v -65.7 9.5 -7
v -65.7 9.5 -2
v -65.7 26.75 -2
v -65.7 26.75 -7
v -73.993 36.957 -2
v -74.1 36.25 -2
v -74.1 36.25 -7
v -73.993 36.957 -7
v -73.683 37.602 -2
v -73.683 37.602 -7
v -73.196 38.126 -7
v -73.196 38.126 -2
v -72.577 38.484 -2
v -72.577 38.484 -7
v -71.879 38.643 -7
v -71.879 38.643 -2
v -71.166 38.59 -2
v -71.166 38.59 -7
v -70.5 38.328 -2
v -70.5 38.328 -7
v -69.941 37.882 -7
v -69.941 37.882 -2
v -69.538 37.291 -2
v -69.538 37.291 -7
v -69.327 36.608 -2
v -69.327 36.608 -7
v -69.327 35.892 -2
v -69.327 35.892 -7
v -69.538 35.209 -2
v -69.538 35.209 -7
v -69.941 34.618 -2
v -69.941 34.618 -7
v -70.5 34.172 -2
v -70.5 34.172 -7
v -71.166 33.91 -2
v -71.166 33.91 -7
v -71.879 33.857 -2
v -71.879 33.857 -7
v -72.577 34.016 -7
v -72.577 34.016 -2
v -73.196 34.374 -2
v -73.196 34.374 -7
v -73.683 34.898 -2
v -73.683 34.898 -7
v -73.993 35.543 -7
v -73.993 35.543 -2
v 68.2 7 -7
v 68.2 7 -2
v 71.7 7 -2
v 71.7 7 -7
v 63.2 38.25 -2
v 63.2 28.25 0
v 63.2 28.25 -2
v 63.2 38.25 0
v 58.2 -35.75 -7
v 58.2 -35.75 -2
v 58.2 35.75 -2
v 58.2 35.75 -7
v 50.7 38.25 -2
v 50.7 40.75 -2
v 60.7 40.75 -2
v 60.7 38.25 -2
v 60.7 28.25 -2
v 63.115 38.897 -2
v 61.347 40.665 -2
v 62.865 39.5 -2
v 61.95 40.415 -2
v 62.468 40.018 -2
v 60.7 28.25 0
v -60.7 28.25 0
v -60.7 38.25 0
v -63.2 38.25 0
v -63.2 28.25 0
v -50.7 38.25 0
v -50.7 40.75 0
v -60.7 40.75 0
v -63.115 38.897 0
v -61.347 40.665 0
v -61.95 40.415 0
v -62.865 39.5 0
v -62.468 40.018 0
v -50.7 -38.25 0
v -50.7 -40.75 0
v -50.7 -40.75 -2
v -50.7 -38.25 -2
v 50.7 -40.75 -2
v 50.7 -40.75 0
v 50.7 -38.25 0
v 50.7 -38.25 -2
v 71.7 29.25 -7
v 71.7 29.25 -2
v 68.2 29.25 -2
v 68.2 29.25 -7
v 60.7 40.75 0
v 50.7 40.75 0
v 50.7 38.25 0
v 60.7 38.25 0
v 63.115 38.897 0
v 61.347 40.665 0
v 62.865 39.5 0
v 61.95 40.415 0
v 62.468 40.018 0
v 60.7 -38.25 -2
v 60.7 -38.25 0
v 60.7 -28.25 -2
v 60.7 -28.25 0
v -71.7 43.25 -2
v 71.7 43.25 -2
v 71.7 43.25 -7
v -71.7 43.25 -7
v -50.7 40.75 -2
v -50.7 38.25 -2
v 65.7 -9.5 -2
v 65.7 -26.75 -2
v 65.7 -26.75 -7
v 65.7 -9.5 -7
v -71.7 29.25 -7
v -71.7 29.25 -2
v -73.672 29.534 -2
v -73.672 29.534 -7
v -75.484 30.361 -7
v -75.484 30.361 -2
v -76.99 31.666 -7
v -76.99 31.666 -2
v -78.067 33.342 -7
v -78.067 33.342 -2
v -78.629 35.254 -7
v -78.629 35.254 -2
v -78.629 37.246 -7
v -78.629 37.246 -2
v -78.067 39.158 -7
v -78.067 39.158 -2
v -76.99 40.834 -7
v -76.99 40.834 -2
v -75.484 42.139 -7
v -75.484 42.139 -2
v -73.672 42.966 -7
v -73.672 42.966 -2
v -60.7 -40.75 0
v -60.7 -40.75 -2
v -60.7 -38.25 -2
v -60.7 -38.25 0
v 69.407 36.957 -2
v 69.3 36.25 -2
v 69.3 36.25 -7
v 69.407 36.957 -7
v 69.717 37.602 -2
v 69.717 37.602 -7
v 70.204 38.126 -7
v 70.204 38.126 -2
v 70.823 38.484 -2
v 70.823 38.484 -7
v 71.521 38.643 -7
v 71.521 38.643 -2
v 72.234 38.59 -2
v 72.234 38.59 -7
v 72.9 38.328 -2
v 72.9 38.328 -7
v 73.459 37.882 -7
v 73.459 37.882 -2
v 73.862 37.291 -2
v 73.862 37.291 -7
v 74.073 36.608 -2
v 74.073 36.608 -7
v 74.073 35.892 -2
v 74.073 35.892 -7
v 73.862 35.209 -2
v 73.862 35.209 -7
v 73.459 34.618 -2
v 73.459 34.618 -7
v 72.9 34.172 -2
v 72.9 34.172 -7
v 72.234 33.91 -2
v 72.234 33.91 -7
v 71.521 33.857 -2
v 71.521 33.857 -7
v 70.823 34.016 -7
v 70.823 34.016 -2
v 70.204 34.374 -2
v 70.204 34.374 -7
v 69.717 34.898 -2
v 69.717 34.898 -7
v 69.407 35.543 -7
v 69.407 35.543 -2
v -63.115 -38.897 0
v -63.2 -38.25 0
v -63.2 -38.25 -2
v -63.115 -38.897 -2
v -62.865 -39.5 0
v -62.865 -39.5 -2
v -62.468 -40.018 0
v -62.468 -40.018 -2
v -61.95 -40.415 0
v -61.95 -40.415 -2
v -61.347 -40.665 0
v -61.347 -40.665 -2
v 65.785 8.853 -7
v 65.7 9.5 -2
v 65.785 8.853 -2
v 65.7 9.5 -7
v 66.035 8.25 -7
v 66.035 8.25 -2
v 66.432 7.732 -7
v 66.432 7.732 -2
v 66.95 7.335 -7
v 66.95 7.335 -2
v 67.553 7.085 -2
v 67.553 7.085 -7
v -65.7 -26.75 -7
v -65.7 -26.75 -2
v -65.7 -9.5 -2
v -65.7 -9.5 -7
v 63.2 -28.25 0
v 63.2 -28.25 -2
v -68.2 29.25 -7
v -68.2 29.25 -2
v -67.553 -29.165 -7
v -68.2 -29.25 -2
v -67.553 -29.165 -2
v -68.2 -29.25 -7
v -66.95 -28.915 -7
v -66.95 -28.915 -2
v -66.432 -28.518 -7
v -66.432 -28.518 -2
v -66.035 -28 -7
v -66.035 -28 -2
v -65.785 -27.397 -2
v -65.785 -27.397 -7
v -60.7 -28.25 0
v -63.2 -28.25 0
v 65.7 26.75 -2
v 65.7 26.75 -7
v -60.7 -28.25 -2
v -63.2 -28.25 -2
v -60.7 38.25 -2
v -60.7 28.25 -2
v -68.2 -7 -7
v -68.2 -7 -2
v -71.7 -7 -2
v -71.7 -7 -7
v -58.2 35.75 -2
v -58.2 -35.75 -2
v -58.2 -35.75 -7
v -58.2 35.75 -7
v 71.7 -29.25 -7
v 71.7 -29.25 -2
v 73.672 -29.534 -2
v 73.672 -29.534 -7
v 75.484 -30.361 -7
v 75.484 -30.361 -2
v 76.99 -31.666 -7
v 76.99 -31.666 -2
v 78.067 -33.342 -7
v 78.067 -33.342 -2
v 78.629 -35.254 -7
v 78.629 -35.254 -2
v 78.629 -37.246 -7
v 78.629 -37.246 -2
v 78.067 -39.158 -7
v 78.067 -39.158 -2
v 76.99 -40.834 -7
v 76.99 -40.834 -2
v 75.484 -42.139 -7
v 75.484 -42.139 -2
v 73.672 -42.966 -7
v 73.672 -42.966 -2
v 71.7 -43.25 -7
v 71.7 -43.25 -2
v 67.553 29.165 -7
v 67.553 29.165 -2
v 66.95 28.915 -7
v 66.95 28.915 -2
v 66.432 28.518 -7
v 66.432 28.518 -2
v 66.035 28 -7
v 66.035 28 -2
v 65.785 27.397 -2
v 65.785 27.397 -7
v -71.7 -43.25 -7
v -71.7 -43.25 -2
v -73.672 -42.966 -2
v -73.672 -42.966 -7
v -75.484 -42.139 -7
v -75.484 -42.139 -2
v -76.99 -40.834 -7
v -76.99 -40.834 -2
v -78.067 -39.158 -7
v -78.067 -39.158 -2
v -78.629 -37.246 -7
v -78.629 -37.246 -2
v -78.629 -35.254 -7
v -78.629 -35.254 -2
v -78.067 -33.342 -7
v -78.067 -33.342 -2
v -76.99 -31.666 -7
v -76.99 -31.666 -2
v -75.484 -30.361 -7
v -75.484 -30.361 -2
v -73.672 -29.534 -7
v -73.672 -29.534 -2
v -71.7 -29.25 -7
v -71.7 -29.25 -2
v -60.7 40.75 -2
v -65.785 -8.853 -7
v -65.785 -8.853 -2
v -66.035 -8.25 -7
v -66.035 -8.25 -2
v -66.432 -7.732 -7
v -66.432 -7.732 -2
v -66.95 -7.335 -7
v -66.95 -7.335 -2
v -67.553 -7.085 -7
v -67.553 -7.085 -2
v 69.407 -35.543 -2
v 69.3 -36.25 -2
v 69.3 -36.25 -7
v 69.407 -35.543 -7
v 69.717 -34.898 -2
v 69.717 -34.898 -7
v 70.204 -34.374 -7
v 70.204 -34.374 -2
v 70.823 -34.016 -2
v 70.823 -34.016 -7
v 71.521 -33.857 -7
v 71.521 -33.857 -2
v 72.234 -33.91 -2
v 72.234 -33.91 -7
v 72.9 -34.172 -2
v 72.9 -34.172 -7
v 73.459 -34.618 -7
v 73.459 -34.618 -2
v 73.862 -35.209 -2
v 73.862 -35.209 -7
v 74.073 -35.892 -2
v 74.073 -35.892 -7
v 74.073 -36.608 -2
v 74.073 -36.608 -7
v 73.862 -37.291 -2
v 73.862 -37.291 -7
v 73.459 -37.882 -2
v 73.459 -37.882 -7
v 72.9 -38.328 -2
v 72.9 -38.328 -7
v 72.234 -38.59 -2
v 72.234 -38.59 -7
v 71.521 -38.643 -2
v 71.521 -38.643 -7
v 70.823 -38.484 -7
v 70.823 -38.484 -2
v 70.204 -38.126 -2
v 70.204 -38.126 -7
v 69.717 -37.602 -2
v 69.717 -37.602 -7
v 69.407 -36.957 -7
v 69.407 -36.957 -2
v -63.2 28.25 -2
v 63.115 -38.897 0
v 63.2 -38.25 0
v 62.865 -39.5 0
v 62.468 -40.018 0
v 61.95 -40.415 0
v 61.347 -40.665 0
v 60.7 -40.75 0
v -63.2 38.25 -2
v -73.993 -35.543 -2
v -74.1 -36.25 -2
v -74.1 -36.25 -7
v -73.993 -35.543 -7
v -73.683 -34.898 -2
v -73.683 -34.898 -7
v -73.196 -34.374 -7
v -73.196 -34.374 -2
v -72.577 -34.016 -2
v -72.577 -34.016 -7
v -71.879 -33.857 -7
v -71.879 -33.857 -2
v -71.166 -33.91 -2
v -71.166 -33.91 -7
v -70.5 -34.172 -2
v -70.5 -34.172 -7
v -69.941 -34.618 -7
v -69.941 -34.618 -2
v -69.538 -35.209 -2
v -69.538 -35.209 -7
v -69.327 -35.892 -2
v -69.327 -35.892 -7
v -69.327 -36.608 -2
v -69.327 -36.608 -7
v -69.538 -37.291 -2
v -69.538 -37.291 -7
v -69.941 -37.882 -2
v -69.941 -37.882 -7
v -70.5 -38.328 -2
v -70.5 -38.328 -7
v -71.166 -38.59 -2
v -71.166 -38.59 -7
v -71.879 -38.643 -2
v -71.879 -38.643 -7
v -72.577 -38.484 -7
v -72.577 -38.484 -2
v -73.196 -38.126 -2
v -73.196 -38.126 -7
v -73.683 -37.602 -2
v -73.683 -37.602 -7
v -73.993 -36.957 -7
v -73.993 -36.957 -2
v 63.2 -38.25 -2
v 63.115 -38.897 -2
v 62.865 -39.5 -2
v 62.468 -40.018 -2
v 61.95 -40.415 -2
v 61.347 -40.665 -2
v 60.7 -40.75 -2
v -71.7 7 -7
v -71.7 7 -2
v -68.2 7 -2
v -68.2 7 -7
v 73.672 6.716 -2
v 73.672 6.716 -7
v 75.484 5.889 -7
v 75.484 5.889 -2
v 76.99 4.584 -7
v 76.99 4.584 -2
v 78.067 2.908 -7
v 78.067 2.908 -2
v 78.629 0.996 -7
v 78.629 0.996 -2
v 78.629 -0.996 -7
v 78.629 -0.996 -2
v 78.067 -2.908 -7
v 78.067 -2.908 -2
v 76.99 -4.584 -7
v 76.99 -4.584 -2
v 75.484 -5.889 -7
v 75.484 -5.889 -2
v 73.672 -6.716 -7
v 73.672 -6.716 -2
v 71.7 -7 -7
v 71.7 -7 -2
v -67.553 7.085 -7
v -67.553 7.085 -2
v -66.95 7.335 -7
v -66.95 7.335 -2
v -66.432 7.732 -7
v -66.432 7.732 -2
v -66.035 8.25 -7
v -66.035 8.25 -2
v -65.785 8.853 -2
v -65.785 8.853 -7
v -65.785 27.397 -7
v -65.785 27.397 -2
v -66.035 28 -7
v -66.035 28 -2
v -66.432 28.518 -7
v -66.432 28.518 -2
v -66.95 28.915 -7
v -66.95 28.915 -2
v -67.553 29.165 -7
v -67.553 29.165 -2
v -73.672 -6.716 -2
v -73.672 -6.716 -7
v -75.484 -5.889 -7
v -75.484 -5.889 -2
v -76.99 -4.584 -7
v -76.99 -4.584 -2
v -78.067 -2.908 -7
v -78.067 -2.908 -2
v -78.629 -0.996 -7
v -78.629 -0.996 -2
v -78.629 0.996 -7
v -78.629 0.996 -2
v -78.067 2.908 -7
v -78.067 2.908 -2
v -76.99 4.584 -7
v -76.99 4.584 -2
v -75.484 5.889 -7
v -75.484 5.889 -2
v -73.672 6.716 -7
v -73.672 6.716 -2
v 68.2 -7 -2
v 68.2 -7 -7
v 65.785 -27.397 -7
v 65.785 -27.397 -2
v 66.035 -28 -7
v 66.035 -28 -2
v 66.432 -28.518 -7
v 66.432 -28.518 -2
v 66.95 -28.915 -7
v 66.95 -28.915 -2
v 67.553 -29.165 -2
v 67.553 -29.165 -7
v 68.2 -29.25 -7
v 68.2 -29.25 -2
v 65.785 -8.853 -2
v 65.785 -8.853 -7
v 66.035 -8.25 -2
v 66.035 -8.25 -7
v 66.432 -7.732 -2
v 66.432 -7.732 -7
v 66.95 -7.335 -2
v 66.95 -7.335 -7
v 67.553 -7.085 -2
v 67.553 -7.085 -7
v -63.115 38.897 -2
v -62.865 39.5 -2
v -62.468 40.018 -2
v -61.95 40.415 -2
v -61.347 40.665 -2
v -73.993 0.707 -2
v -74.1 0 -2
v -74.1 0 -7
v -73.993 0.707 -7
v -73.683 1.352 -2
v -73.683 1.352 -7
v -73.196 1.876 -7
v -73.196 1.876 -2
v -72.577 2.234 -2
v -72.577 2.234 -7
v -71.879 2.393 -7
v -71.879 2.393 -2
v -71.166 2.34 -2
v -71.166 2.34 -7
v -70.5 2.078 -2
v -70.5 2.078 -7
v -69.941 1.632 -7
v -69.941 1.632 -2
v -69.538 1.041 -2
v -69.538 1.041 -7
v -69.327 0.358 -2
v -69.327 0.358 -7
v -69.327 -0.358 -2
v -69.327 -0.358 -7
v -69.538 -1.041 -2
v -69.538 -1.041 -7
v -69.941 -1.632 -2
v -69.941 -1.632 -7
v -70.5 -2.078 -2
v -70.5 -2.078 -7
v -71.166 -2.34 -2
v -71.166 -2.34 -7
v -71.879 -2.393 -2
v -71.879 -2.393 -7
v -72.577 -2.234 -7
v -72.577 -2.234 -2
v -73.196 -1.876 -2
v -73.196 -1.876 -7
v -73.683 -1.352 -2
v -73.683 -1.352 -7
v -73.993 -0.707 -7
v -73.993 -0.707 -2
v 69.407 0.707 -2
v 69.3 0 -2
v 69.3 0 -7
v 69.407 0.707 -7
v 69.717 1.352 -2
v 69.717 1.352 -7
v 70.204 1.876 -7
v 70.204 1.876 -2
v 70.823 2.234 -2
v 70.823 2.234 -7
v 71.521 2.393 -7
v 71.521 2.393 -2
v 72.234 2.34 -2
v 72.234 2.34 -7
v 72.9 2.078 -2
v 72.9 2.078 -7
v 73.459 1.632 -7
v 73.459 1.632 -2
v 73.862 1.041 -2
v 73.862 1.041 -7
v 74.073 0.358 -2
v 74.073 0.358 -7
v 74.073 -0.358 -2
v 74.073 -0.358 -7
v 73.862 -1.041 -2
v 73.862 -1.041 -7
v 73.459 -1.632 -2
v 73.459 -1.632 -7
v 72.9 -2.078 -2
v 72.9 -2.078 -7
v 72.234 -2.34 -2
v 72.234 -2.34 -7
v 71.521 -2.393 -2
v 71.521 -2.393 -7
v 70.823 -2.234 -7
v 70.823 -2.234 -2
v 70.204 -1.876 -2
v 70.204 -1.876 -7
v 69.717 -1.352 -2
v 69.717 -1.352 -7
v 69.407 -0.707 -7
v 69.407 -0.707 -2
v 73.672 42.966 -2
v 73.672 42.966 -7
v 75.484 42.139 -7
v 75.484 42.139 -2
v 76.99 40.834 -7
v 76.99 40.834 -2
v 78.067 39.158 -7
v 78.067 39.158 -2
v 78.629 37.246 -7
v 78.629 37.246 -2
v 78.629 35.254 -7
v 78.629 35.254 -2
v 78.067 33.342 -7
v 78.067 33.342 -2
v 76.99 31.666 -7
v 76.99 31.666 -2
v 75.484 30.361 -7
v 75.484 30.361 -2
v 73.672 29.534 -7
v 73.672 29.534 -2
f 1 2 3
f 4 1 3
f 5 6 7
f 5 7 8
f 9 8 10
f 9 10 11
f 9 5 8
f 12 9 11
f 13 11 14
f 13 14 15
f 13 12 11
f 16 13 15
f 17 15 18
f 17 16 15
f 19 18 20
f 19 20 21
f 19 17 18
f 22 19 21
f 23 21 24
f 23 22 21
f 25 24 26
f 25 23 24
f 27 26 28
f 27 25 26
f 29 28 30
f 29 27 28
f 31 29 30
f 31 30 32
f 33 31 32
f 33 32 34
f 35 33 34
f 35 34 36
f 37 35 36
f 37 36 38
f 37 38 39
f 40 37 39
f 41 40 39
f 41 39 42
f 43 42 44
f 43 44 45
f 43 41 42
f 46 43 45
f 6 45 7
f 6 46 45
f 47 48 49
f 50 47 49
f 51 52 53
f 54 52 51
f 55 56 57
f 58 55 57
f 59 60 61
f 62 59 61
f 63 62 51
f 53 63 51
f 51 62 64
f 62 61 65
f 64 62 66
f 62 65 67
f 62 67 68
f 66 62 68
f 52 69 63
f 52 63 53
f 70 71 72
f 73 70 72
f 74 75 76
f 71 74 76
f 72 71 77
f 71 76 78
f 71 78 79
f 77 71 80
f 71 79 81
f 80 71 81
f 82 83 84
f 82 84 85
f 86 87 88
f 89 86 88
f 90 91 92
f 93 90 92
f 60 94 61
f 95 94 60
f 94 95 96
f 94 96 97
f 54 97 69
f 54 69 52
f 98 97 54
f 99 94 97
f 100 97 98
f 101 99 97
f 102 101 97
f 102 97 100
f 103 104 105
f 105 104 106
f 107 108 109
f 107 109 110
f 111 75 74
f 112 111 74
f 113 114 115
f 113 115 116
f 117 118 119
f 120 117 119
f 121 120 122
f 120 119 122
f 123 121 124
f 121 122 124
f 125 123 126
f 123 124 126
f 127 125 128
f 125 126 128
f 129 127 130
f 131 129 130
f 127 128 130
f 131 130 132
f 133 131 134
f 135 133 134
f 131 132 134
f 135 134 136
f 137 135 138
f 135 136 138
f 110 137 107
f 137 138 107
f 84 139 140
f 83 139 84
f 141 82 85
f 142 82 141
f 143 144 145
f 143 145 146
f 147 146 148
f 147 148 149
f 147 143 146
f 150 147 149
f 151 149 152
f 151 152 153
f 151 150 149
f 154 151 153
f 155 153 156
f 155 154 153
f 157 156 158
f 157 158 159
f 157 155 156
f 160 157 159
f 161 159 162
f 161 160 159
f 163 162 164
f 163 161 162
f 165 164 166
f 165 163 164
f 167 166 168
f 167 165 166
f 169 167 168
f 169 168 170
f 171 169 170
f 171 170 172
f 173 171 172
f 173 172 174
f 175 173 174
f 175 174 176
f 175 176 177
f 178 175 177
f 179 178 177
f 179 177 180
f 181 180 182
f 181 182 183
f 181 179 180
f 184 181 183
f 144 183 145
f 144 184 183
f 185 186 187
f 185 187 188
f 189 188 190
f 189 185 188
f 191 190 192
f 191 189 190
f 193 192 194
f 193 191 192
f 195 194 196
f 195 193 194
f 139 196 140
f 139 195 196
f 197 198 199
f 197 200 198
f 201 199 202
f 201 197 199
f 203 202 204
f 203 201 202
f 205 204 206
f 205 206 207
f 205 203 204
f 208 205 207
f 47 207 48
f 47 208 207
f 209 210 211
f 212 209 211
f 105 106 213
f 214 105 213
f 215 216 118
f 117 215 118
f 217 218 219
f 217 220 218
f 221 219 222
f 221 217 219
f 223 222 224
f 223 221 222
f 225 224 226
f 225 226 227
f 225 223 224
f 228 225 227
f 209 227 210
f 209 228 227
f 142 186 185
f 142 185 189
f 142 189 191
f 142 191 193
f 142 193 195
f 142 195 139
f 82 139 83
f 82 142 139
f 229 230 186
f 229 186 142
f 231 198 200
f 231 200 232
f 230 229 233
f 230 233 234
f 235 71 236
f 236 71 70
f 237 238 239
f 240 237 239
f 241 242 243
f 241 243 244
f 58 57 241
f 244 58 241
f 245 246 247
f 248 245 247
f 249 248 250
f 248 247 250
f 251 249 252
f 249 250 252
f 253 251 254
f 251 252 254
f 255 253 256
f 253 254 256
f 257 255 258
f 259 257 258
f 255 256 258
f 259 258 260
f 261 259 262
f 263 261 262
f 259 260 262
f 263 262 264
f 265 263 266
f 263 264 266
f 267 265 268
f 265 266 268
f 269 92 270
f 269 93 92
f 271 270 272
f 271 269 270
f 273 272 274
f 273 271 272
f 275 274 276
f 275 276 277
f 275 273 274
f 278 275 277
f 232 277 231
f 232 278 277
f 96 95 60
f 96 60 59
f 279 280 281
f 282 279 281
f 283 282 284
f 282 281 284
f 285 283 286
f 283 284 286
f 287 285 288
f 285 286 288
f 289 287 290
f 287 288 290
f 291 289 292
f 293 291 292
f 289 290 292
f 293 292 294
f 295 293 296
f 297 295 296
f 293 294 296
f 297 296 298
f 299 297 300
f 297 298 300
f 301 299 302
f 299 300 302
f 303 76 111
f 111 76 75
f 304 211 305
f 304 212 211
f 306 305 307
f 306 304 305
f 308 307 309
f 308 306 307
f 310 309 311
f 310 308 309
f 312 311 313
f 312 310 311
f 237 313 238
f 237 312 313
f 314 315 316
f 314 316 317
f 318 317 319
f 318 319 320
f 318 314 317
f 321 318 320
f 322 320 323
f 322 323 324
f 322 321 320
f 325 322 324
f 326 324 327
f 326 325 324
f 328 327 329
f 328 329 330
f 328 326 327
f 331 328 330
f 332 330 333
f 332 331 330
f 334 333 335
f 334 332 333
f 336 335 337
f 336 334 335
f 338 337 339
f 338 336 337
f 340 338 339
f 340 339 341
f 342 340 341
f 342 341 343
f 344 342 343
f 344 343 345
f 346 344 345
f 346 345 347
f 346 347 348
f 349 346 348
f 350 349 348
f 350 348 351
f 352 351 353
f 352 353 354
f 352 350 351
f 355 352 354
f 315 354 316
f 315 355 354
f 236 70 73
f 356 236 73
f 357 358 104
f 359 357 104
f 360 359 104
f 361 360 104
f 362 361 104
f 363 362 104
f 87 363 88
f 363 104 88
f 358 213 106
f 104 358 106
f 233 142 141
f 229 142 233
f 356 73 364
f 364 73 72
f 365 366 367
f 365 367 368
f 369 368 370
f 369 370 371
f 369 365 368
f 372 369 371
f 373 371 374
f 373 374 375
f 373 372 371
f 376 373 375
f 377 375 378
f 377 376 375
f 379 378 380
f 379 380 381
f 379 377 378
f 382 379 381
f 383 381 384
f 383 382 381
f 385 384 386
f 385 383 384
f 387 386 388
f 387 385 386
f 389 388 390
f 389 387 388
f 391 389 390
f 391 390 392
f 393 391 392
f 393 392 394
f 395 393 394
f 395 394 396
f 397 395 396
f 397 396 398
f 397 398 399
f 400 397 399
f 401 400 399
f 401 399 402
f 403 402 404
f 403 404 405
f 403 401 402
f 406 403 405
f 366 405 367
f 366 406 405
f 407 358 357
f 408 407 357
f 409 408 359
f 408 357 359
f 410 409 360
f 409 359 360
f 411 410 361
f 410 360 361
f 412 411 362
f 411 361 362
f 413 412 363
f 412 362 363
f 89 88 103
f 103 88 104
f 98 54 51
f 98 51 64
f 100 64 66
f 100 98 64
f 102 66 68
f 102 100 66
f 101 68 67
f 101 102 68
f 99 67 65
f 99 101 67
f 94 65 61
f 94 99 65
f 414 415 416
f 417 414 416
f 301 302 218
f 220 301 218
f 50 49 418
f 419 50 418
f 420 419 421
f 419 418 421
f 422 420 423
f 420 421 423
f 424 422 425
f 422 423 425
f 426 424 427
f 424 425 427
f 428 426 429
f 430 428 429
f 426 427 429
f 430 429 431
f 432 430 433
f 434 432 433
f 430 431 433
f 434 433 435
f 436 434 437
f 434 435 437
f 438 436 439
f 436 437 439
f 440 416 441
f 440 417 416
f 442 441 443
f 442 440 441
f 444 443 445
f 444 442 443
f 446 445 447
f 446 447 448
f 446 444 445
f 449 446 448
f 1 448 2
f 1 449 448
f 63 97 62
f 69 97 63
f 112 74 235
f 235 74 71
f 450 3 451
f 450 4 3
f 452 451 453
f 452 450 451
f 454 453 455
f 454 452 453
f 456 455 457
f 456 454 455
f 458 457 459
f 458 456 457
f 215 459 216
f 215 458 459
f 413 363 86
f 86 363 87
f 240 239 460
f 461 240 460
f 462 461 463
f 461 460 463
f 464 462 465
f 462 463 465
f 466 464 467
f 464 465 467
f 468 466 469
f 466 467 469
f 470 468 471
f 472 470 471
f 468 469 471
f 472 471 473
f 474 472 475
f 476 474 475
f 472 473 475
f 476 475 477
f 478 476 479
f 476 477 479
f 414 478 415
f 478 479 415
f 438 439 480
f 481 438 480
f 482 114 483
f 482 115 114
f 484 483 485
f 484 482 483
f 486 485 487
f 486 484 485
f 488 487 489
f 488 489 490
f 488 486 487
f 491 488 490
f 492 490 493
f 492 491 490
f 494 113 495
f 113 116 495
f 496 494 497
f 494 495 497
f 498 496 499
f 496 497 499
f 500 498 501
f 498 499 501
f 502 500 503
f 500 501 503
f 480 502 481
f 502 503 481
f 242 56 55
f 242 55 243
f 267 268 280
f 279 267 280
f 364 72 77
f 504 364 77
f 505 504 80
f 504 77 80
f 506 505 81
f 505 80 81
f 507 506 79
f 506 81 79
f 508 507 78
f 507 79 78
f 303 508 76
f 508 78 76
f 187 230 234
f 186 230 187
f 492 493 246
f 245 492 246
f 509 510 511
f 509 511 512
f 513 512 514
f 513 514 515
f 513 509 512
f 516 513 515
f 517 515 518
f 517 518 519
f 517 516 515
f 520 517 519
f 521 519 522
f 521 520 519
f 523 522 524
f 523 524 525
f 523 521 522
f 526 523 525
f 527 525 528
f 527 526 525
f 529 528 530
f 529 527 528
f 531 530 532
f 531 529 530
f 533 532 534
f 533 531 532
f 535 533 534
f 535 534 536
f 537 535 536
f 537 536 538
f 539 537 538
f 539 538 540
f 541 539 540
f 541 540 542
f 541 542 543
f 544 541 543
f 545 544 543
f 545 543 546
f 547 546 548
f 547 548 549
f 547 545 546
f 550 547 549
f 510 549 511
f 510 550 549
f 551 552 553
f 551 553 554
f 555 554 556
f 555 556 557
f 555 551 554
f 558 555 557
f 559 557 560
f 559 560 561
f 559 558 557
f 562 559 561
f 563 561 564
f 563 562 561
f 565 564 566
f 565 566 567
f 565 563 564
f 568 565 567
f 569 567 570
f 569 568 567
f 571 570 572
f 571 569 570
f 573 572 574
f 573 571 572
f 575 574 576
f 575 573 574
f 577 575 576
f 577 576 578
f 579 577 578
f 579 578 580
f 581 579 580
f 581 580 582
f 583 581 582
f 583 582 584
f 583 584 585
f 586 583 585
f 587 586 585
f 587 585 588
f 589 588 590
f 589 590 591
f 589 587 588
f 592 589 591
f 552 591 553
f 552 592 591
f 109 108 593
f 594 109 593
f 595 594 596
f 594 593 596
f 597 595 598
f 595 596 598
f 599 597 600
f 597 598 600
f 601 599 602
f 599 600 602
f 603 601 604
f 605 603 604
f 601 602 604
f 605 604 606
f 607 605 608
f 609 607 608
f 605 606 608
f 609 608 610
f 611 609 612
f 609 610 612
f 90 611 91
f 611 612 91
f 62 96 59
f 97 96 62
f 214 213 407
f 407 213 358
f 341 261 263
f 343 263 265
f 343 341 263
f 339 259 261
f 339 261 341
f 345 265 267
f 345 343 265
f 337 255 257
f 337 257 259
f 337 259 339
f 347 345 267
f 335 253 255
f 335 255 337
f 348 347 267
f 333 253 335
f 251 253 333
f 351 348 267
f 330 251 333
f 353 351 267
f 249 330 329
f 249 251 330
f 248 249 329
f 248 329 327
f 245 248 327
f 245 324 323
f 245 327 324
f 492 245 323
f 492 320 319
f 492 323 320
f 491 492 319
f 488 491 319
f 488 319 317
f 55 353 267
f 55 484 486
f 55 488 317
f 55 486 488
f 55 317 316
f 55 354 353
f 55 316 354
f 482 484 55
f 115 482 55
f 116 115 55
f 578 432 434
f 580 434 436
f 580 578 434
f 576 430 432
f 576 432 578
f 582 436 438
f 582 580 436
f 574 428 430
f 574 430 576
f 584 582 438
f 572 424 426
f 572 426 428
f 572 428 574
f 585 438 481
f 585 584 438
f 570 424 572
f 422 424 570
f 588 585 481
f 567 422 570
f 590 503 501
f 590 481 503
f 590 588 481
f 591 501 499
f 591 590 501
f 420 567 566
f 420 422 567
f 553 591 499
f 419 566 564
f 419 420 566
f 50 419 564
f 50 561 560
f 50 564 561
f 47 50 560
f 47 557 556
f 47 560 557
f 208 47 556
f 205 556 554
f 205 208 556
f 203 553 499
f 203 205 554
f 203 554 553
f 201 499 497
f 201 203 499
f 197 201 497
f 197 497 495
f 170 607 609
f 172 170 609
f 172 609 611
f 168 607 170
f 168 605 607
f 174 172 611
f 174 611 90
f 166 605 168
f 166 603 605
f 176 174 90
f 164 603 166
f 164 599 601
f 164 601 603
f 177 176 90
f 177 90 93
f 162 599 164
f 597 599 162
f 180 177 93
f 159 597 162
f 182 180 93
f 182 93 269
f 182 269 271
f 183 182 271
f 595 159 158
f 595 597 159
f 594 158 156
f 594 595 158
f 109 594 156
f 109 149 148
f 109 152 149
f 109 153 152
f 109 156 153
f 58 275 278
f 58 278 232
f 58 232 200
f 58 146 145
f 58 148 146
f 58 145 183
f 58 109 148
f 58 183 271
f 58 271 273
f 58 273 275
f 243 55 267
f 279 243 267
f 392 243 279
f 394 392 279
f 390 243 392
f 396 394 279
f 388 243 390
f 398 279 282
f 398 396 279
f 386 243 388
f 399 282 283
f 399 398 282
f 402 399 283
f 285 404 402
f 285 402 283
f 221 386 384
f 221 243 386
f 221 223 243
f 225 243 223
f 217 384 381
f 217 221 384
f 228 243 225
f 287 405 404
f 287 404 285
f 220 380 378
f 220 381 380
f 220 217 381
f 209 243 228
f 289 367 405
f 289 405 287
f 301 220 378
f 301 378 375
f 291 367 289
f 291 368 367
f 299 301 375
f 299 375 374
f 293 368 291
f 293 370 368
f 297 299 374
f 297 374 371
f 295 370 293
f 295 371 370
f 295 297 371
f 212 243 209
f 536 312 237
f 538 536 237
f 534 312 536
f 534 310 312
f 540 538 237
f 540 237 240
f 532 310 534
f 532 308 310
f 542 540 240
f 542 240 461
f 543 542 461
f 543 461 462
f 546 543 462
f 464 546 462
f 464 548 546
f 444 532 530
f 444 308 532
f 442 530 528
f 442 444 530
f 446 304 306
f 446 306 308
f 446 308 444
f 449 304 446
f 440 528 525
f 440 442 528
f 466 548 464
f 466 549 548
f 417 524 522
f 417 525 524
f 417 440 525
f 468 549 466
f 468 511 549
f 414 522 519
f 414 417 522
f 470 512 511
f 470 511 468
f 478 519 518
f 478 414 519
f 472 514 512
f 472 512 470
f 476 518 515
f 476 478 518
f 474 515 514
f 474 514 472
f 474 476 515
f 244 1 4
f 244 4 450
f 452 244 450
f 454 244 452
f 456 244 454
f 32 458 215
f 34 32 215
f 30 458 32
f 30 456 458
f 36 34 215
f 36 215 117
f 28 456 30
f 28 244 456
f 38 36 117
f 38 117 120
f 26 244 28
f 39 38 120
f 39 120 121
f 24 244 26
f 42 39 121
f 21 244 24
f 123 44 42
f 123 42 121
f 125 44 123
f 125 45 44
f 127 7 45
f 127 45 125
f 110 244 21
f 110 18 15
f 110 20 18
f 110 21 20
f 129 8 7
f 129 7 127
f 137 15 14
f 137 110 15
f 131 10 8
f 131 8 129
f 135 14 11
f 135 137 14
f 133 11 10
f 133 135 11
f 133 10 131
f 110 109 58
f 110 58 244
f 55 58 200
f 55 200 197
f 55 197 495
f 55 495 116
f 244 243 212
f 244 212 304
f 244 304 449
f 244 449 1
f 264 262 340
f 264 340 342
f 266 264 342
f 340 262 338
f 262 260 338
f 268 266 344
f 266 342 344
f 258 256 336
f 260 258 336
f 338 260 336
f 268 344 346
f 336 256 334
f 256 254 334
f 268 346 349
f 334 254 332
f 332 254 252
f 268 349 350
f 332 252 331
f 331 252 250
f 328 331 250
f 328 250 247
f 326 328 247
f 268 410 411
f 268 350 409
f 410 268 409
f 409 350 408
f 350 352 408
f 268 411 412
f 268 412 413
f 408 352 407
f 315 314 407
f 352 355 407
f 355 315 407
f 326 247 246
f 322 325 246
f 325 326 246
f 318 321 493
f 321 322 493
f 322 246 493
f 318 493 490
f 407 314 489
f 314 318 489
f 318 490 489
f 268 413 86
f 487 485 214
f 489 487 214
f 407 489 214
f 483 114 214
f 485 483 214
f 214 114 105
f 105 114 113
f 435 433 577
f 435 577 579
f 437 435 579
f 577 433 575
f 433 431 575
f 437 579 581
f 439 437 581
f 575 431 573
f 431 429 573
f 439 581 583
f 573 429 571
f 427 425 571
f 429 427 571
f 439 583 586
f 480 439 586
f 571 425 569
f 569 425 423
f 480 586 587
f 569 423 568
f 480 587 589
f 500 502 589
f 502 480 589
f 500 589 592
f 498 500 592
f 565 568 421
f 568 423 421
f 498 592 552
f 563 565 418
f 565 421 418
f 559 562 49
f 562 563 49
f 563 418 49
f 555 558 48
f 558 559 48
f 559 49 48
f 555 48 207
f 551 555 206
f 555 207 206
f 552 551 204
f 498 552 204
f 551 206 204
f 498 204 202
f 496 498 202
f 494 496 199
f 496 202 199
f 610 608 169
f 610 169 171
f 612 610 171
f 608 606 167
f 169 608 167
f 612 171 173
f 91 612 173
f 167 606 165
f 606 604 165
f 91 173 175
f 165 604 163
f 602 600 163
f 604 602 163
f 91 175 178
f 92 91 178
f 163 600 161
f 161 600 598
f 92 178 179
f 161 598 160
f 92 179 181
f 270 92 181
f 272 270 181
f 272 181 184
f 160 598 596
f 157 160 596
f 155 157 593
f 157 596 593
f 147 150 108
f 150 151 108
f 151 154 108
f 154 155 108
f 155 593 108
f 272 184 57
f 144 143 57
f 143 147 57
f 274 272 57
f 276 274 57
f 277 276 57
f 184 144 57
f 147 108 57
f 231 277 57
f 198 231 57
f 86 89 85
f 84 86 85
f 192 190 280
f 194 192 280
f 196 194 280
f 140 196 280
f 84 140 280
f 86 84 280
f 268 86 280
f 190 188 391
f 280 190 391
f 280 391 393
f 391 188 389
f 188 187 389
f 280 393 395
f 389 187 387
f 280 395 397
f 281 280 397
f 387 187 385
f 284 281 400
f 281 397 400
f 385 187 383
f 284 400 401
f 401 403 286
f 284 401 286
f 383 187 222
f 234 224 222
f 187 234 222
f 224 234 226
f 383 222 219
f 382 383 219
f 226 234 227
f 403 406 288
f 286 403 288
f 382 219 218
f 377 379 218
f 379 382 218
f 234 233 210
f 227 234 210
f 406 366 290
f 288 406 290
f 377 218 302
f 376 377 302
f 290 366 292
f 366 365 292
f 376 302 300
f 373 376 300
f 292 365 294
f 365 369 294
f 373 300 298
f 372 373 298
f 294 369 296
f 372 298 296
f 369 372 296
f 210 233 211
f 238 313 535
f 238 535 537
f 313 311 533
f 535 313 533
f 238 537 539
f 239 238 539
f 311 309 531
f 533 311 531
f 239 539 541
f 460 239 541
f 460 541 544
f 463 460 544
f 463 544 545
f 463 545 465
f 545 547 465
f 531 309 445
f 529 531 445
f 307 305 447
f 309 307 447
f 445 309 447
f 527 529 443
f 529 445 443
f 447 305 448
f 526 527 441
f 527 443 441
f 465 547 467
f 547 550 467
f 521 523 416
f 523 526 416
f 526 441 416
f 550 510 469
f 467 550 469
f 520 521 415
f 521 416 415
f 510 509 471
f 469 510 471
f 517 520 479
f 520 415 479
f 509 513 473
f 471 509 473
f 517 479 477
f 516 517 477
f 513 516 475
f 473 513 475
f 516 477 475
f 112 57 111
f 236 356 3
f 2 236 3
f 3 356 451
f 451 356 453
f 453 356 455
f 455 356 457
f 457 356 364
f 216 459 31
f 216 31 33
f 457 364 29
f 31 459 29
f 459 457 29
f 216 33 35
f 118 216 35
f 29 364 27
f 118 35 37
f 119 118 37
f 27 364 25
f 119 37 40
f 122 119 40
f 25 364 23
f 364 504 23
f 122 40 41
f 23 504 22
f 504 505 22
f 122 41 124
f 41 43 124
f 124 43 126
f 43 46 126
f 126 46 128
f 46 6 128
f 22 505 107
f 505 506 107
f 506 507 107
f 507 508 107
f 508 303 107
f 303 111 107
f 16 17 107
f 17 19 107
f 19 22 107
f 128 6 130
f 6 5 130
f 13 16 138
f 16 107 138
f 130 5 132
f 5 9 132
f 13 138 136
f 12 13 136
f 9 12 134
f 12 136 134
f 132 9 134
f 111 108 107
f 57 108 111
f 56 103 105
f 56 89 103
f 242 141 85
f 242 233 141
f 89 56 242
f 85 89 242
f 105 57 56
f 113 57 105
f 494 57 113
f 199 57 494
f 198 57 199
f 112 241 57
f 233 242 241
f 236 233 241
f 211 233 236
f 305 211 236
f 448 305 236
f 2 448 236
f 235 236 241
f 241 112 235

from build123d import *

# Parameters (mm, degrees)
BOSS_EXTRUDE3_DEPTH   = 2
BOSS_EXTRUDE3_2_DEPTH = 2
BOSS_EXTRUDE3_3_DEPTH = 2
BOSS_EXTRUDE3_4_DEPTH = 2
SKETCH2_W             = 131.4
SKETCH2_H             = 86.5
SKETCH2_W_2           = 116.4
SKETCH2_H_2           = 71.5
SKETCH2_R             = 2.4
BOSS_EXTRUDE4_DEPTH   = 5
FILLET1_R             = 2.5


with BuildPart() as part:
    # Sketch1 → Boss-Extrude3 (new body)
    with BuildSketch(Plane.XY):
        with BuildLine():
            ThreePointArc((63.2, -38.25), (62.467766953, -40.017766953), (60.7, -40.75))
            Line((60.7, -40.75), (50.7, -40.75))
            Line((50.7, -40.75), (50.7, -38.25))
            Line((50.7, -38.25), (60.7, -38.25))
            Line((60.7, -38.25), (60.7, -28.25))
            Line((60.7, -28.25), (63.2, -28.25))
            Line((63.2, -28.25), (63.2, -38.25))
        make_face()
    extrude(amount=-BOSS_EXTRUDE3_DEPTH)



with BuildPart() as body_2:
    # Sketch1 → Boss-Extrude3 2 (new body)
    with BuildSketch(Plane.XY):
        with BuildLine():
            Line((63.2, 28.25), (63.2, 38.25))
            ThreePointArc((63.2, 38.25), (62.467766953, 40.017766953), (60.7, 40.75))
            Line((60.7, 40.75), (50.7, 40.75))
            Line((50.7, 40.75), (50.7, 38.25))
            Line((50.7, 38.25), (60.7, 38.25))
            Line((60.7, 38.25), (60.7, 28.25))
            Line((60.7, 28.25), (63.2, 28.25))
        make_face()
    extrude(amount=-BOSS_EXTRUDE3_2_DEPTH)


with BuildPart() as body_3:
    # Sketch1 → Boss-Extrude3 3 (new body)
    with BuildSketch(Plane.XY):
        with BuildLine():
            ThreePointArc((-63.2, 38.25), (-62.467766953, 40.017766953), (-60.7, 40.75))
            Line((-60.7, 40.75), (-50.7, 40.75))
            Line((-50.7, 40.75), (-50.7, 38.25))
            Line((-50.7, 38.25), (-60.7, 38.25))
            Line((-60.7, 38.25), (-60.7, 28.25))
            Line((-60.7, 28.25), (-63.2, 28.25))
            Line((-63.2, 28.25), (-63.2, 38.25))
        make_face()
    extrude(amount=-BOSS_EXTRUDE3_3_DEPTH)


with BuildPart() as body_4:
    # Sketch1 → Boss-Extrude3 4 (new body)
    with BuildSketch(Plane.XY):
        with BuildLine():
            Line((-63.2, -28.25), (-63.2, -38.25))
            ThreePointArc((-63.2, -38.25), (-62.467766953, -40.017766953), (-60.7, -40.75))
            Line((-60.7, -40.75), (-50.7, -40.75))
            Line((-50.7, -40.75), (-50.7, -38.25))
            Line((-50.7, -38.25), (-60.7, -38.25))
            Line((-60.7, -38.25), (-60.7, -28.25))
            Line((-60.7, -28.25), (-63.2, -28.25))
        make_face()
    extrude(amount=-BOSS_EXTRUDE3_4_DEPTH)


with BuildPart() as part_1:
    add(part.part)

    add(body_3.part)  # Boss-Extrude4 merges body 3

    add(body_4.part)  # Boss-Extrude4 merges body 4
    # Sketch2 → Boss-Extrude4 (add)
    # profile 1 of 8: a face of its own
    with BuildSketch(Plane(origin=(0, 0, -2), x_dir=(-1, 0, 0), z_dir=(0, 0, -1))):
        Rectangle(SKETCH2_W, SKETCH2_H)
        Rectangle(SKETCH2_W_2, SKETCH2_H_2, mode=Mode.SUBTRACT)
        with BuildLine():
            Line((-63.2, 38.25), (-63.2, 28.25))
            Line((-63.2, 28.25), (-60.7, 28.25))
            Line((-60.7, 28.25), (-60.7, 38.25))
            Line((-60.7, 38.25), (-50.7, 38.25))
            Line((-50.7, 38.25), (-50.7, 40.75))
            Line((-50.7, 40.75), (-60.7, 40.75))
            ThreePointArc((-60.7, 40.75), (-62.467766953, 40.017766953), (-63.2, 38.25))
        make_face(mode=Mode.SUBTRACT)
    # profile 2 of 8: a face of its own
    with BuildSketch(Plane(origin=(0, 0, -2), x_dir=(-1, 0, 0), z_dir=(0, 0, -1))):
        with BuildLine():
            Line((-65.7, 29.25), (-65.7, 43.25))
            Line((-65.7, 43.25), (-71.7, 43.25))
            ThreePointArc((-71.7, 43.25), (-78.7, 36.25), (-71.7, 29.25))
            Line((-71.7, 29.25), (-65.7, 29.25))
        make_face()
        with Locations((-71.7, 36.25)):
            Circle(SKETCH2_R, mode=Mode.SUBTRACT)
    # profile 3 of 8: a face of its own
    with BuildSketch(Plane(origin=(0, 0, -2), x_dir=(-1, 0, 0), z_dir=(0, 0, -1))):
        with BuildLine():
            Line((-65.7, -7), (-65.7, 7))
            Line((-65.7, 7), (-71.7, 7))
            ThreePointArc((-71.7, 7), (-78.7, 0), (-71.7, -7))
            Line((-71.7, -7), (-65.7, -7))
        make_face()
        with Locations((-71.7, 0)):
            Circle(SKETCH2_R, mode=Mode.SUBTRACT)
    # profile 4 of 8: a face of its own
    with BuildSketch(Plane(origin=(0, 0, -2), x_dir=(-1, 0, 0), z_dir=(0, 0, -1))):
        with BuildLine():
            Line((-65.7, -43.25), (-65.7, -29.25))
            Line((-65.7, -29.25), (-71.7, -29.25))
            ThreePointArc((-71.7, -29.25), (-78.7, -36.25), (-71.7, -43.25))
            Line((-71.7, -43.25), (-65.7, -43.25))
        make_face()
        with Locations((-71.7, -36.25)):
            Circle(SKETCH2_R, mode=Mode.SUBTRACT)
    # profile 5 of 8: a face of its own
    with BuildSketch(Plane(origin=(0, 0, -2), x_dir=(-1, 0, 0), z_dir=(0, 0, -1))):
        with BuildLine():
            Line((71.7, 43.25), (65.7, 43.25))
            Line((65.7, 43.25), (65.7, 29.25))
            Line((65.7, 29.25), (71.7, 29.25))
            ThreePointArc((71.7, 29.25), (78.7, 36.25), (71.7, 43.25))
        make_face()
        with Locations((71.7, 36.25)):
            Circle(SKETCH2_R, mode=Mode.SUBTRACT)
    # profile 6 of 8: a face of its own
    with BuildSketch(Plane(origin=(0, 0, -2), x_dir=(-1, 0, 0), z_dir=(0, 0, -1))):
        with BuildLine():
            Line((71.7, 7), (65.7, 7))
            Line((65.7, 7), (65.7, -7))
            Line((65.7, -7), (71.7, -7))
            ThreePointArc((71.7, -7), (78.7, 0), (71.7, 7))
        make_face()
        with Locations((71.7, 0)):
            Circle(SKETCH2_R, mode=Mode.SUBTRACT)
    # profile 7 of 8: a face of its own
    with BuildSketch(Plane(origin=(0, 0, -2), x_dir=(-1, 0, 0), z_dir=(0, 0, -1))):
        with BuildLine():
            Line((71.7, -29.25), (65.7, -29.25))
            Line((65.7, -29.25), (65.7, -43.25))
            Line((65.7, -43.25), (71.7, -43.25))
            ThreePointArc((71.7, -43.25), (78.7, -36.25), (71.7, -29.25))
        make_face()
        with Locations((71.7, -36.25)):
            Circle(SKETCH2_R, mode=Mode.SUBTRACT)
    # profile 8 of 8: a face of its own
    with BuildSketch(Plane(origin=(0, 0, -2), x_dir=(-1, 0, 0), z_dir=(0, 0, -1))):
        with BuildLine():
            ThreePointArc((-60.7, 40.75), (-62.467766953, 40.017766953), (-63.2, 38.25))
            Line((-63.2, 38.25), (-63.2, 28.25))
            Line((-63.2, 28.25), (-60.7, 28.25))
            Line((-60.7, 28.25), (-60.7, 38.25))
            Line((-60.7, 38.25), (-50.7, 38.25))
            Line((-50.7, 38.25), (-50.7, 40.75))
            Line((-50.7, 40.75), (-60.7, 40.75))
        make_face()
    extrude(amount=BOSS_EXTRUDE4_DEPTH)

    # Fillet1
    fillet1_edges = [part_1.edges().sort_by_distance(p)[0] for p in [
        (-65.7, 7, -4.5),
        (-65.7, 29.25, -4.5),
        (65.7, 29.25, -4.5),
        (65.7, 7, -4.5),
        (65.7, -7, -4.5),
        (65.7, -29.25, -4.5),
        (-65.7, -29.25, -4.5),
        (-65.7, -7, -4.5),
    ]]
    fillet(fillet1_edges, radius=FILLET1_R)


solid = Compound([body_2.part, part_1.part])
